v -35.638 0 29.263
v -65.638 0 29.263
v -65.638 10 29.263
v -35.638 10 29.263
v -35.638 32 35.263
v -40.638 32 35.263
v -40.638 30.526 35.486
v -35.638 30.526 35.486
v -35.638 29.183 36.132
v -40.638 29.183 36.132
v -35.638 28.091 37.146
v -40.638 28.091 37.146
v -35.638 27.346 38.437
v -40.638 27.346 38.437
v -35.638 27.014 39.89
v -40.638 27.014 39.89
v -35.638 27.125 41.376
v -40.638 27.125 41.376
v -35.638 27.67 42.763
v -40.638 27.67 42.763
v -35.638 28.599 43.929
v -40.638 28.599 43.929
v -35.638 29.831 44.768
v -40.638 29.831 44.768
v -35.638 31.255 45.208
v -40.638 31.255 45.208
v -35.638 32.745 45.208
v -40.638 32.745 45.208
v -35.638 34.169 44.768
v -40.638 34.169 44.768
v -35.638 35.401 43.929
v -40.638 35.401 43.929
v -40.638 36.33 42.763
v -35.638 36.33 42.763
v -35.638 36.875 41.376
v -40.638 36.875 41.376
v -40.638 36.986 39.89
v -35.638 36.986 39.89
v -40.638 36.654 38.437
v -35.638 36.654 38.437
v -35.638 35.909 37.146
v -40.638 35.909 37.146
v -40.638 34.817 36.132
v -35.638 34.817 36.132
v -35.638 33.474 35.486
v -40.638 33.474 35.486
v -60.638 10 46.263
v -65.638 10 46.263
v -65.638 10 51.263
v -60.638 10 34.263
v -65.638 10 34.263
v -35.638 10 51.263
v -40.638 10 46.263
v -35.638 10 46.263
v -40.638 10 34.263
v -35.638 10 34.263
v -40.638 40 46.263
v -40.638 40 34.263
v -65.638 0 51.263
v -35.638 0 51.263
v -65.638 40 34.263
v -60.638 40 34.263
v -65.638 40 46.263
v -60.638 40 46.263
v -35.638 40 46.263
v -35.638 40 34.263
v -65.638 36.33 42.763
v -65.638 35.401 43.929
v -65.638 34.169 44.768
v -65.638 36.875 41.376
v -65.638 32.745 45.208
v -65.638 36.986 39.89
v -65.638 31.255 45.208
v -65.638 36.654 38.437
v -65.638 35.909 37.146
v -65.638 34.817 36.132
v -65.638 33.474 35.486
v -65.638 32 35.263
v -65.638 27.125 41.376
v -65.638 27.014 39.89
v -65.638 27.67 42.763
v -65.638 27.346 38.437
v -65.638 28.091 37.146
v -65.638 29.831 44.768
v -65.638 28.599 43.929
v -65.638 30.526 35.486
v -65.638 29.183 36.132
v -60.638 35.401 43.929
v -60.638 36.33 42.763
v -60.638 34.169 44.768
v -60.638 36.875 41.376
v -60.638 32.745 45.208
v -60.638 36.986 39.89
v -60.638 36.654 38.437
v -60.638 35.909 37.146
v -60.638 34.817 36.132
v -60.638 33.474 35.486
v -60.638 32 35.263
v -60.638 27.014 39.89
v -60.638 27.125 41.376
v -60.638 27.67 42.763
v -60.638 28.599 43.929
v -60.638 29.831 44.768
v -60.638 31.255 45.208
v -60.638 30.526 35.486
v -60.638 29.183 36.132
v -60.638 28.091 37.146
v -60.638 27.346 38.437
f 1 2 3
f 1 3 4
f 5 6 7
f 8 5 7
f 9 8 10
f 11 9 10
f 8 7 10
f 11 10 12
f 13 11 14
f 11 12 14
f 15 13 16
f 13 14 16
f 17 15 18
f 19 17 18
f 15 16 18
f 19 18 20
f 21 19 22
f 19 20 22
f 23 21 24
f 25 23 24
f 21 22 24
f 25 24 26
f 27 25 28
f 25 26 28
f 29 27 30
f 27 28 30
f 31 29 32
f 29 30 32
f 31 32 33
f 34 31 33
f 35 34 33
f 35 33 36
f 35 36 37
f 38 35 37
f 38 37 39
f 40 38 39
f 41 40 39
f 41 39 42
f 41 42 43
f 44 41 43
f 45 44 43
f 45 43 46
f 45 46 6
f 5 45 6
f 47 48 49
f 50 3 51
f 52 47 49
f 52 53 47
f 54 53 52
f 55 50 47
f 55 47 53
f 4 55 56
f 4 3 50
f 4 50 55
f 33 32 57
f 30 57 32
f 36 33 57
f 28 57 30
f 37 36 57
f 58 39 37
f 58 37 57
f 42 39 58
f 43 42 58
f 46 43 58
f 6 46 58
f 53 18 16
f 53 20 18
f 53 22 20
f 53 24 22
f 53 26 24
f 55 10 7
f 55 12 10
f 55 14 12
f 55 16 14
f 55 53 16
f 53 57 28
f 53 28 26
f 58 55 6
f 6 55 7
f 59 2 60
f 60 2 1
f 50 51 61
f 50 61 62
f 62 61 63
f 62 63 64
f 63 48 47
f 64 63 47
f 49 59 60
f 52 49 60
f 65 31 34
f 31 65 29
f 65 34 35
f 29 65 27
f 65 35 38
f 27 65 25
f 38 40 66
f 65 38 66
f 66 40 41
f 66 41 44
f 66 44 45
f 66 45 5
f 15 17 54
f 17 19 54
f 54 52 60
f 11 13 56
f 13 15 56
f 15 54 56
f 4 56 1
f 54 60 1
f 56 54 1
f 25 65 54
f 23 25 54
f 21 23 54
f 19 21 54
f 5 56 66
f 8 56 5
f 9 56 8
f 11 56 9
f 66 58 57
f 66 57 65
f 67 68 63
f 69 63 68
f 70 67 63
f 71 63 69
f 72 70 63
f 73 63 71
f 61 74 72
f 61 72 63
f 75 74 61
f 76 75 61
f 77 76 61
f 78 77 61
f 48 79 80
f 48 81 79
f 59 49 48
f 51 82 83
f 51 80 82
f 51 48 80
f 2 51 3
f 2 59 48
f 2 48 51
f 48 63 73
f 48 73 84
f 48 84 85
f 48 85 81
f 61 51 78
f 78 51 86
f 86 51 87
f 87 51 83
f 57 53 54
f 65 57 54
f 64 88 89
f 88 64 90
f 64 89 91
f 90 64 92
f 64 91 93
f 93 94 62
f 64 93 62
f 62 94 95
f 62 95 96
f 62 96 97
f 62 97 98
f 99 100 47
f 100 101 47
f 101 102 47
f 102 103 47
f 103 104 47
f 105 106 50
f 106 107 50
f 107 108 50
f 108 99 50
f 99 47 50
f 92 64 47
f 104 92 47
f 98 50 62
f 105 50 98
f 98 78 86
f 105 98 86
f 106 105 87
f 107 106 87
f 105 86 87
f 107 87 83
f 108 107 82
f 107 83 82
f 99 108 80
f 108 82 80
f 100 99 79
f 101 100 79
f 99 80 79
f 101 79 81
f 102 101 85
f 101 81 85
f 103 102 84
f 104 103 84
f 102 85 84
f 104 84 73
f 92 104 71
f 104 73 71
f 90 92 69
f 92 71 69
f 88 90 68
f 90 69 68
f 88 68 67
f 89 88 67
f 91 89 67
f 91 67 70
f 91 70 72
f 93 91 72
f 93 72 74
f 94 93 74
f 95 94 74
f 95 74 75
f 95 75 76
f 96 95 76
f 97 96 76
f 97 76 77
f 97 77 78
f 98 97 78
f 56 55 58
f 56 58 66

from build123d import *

# Parameters (mm, degrees)
SKETCH1_W           = 30
SKETCH1_H           = 22
BOSS_EXTRUDE1_DEPTH = 10
SKETCH1_4_W         = 5
SKETCH1_4_H         = 12
BOSS_EXTRUDE2_DEPTH = 40
SKETCH2_R           = 5
CUT_EXTRUDE1_DEPTH  = 40


with BuildPart() as part:
    # Sketch1 → Boss-Extrude1 (new body)
    with BuildSketch(Plane(origin=(0, 0, 0), x_dir=(1, 0, 0), z_dir=(0, 1, 0))):
        with Locations((-50.637562945, -40.26337684)):
            Rectangle(SKETCH1_W, SKETCH1_H)
    extrude(amount=BOSS_EXTRUDE1_DEPTH)

    # Sketch1<4> → Boss-Extrude2 (add)
    with BuildSketch(Plane(origin=(0, 0, 0), x_dir=(1, 0, 0), z_dir=(0, 1, 0))):
        with Locations((-63.137562945, -40.26337684)):
            Rectangle(SKETCH1_4_W, SKETCH1_4_H)
        with Locations((-38.137562945, -40.26337684)):
            Rectangle(SKETCH1_4_W, SKETCH1_4_H)
    extrude(amount=BOSS_EXTRUDE2_DEPTH)

    # Sketch2 → Cut-Extrude1 (cut)
    with BuildSketch(Plane.ZY.offset(65.637562945)):
        with Locations((40.26337684, 32)):
            Circle(SKETCH2_R)
    extrude(amount=-CUT_EXTRUDE1_DEPTH, mode=Mode.SUBTRACT)


solid = part.part
